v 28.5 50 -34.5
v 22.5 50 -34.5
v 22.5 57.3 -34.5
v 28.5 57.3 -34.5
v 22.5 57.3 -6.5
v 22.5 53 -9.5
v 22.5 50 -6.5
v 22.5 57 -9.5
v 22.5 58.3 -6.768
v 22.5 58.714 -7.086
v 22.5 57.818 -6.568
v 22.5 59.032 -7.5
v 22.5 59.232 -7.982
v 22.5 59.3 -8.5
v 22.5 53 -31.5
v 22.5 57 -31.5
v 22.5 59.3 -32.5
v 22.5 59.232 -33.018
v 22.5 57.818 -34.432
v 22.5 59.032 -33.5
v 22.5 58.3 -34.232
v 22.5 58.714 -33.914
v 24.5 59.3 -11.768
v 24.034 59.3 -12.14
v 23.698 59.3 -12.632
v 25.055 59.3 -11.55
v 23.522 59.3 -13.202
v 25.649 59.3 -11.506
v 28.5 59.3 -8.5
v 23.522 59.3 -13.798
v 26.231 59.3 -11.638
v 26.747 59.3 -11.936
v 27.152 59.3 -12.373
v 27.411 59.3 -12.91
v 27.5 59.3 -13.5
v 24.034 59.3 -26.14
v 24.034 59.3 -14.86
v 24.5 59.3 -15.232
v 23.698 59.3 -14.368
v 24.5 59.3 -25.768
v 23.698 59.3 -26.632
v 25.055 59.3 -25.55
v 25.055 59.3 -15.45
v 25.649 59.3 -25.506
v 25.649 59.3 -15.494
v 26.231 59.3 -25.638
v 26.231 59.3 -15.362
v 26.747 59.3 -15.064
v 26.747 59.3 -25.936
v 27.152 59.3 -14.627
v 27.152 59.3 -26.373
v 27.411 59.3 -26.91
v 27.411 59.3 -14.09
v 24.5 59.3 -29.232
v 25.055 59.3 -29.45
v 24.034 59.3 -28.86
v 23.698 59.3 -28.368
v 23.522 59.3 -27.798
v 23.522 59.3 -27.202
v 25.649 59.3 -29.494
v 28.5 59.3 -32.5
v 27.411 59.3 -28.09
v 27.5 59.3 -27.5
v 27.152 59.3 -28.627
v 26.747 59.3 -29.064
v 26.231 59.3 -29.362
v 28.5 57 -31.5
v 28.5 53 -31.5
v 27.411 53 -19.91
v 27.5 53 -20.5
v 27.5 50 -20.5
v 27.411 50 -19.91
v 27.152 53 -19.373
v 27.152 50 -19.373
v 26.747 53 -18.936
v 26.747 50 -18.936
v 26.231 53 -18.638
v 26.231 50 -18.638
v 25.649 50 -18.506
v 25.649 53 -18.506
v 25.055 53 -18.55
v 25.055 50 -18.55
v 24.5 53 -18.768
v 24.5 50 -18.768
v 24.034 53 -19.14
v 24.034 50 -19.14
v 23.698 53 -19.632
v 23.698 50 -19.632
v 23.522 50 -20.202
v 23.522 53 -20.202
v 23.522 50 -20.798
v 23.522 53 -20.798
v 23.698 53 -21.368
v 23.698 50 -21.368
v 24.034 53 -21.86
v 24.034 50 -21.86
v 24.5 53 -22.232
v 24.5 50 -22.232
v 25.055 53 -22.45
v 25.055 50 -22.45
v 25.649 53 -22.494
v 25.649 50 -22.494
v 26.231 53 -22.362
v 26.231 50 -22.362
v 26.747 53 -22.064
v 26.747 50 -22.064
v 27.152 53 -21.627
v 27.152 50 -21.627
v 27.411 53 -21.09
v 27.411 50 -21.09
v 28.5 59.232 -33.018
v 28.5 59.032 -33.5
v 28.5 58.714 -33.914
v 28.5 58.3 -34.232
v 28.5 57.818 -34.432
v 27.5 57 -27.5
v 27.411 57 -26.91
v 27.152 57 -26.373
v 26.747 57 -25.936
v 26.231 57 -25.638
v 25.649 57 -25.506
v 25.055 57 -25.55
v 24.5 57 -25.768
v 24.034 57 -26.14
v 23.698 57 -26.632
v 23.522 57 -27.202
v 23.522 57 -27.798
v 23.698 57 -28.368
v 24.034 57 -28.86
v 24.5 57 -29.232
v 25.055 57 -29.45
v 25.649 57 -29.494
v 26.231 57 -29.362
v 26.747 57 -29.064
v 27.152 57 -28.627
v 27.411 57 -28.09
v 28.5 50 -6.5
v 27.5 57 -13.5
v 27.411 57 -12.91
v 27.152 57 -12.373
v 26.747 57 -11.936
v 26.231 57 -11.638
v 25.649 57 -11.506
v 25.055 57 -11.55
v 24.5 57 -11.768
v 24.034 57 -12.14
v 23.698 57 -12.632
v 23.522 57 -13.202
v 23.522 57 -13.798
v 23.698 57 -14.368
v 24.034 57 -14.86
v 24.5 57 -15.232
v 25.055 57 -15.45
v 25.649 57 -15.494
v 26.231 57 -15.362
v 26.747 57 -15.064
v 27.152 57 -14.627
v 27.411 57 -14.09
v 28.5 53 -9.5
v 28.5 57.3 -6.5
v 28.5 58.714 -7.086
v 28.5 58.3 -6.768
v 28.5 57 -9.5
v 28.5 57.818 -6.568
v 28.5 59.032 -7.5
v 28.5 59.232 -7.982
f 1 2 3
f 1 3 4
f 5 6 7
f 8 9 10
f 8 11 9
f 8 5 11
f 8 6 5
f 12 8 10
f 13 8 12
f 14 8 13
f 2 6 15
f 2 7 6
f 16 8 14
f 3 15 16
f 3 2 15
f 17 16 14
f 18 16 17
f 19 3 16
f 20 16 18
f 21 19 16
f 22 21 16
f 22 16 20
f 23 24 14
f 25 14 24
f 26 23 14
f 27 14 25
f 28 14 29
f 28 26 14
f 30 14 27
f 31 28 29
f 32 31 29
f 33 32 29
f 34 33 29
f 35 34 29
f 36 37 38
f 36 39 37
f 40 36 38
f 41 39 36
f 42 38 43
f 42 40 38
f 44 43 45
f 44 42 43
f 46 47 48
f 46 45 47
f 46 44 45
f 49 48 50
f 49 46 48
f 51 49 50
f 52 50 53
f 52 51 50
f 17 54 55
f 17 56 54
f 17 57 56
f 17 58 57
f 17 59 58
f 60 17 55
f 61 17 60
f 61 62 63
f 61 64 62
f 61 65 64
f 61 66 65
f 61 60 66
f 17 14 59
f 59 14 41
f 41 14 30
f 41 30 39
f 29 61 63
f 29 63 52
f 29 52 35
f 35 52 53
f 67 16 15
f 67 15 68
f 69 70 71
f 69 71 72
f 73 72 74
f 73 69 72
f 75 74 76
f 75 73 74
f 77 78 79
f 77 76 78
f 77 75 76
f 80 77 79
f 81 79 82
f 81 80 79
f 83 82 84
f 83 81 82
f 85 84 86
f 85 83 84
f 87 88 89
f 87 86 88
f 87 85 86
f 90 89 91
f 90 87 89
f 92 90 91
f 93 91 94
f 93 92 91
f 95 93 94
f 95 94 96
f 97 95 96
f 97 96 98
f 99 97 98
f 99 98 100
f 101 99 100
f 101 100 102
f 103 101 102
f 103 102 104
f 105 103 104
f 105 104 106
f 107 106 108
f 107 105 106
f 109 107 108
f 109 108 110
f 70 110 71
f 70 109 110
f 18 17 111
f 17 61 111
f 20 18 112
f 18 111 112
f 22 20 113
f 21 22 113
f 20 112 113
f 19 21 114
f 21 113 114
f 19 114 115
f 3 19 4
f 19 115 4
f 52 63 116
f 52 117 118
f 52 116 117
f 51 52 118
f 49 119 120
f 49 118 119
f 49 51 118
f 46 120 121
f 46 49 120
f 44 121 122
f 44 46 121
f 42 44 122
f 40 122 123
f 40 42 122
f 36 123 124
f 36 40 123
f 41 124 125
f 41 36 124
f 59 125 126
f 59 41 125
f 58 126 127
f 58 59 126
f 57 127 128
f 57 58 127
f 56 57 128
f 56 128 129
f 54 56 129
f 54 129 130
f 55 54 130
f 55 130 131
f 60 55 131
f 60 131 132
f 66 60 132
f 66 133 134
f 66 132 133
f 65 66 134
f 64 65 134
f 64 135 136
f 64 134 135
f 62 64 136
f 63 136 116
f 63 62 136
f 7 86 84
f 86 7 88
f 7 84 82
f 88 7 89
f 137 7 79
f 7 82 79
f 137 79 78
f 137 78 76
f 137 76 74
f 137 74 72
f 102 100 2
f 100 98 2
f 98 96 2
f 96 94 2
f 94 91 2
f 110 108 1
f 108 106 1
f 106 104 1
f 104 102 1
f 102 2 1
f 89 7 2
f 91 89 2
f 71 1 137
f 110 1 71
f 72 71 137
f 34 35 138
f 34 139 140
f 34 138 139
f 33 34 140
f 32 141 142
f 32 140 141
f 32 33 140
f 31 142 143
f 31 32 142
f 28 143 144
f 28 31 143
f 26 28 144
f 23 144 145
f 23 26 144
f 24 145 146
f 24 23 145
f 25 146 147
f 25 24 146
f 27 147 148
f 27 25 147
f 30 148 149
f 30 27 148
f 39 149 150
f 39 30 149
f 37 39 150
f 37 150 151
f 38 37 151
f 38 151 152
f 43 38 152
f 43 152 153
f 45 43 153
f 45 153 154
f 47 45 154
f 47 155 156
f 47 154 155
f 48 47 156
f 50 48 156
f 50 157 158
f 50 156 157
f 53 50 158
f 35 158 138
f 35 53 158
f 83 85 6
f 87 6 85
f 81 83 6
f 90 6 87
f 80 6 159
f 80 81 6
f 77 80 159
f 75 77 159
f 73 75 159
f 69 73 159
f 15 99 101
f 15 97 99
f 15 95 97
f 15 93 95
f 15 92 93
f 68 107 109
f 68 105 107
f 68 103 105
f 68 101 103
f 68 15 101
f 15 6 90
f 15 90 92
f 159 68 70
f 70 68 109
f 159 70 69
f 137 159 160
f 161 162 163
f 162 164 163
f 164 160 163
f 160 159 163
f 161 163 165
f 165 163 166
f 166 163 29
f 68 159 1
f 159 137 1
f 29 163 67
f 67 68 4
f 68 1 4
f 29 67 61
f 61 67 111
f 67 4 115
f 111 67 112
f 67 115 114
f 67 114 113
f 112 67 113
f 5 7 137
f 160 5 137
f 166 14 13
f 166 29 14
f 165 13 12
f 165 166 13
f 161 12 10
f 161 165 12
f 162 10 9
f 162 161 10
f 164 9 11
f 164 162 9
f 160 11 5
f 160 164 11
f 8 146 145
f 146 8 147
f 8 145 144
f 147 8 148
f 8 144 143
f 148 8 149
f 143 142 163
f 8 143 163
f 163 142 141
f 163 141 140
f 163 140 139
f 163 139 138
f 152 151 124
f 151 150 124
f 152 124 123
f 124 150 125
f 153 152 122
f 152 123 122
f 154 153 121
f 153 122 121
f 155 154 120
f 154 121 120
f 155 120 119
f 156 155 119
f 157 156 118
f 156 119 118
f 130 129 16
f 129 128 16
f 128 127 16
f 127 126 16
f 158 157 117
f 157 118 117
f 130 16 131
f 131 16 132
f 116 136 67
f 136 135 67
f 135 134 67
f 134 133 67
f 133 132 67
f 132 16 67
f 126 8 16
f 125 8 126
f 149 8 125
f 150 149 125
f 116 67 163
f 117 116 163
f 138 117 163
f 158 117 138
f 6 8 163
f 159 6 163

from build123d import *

# Parameters (mm, degrees)
BOX226_W          = 6
BOX226_H          = 4
BOX226_DEPTH      = 3
CYLINDER090_R     = 2
CYLINDER090_DEPTH = 5
CYLINDER089_R     = 2
CYLINDER089_DEPTH = 5
BOX223_W          = 6
BOX223_H          = 2.3
BOX223_DEPTH      = 28
FILLET056_R       = 2
BOX225_W          = 6
BOX225_H          = 4
BOX225_DEPTH      = 3
CYLINDER091_R     = 2
CYLINDER091_DEPTH = 5
BOX224_W          = 6
BOX224_H          = 3
BOX224_DEPTH      = 28


with BuildPart() as cube214:
    # Box226 → Box226 (new body)
    with BuildSketch(Plane(origin=(22.5, 53, -9.5), x_dir=(1, 0, 0), z_dir=(0, 0, 1))):
        with Locations((3, 2)):
            Rectangle(BOX226_W, BOX226_H)
    extrude(amount=BOX226_DEPTH)


with BuildPart() as cylinder171:
    # Cylinder090 → Cylinder090 (new body)
    with BuildSketch(Plane(origin=(25.5, 60, -27.5), x_dir=(1, 0, 0), z_dir=(0, -1, 0))):
        Circle(CYLINDER090_R)
    extrude(amount=CYLINDER090_DEPTH)


with BuildPart() as cylinder170:
    # Cylinder089 → Cylinder089 (new body)
    with BuildSketch(Plane(origin=(25.5, 60, -13.5), x_dir=(1, 0, 0), z_dir=(0, -1, 0))):
        Circle(CYLINDER089_R)
    extrude(amount=CYLINDER089_DEPTH)


with BuildPart() as fillet056:
    # Box223 → Box223 (new body)
    with BuildSketch(Plane(origin=(22.5, 57, -34.5), x_dir=(1, 0, 0), z_dir=(0, 0, 1))):
        with Locations((3, 1.15)):
            Rectangle(BOX223_W, BOX223_H)
    extrude(amount=BOX223_DEPTH)

    # Cut113: cut Cylinder170
    add(cylinder170.part, mode=Mode.SUBTRACT)

    # Cut114: cut Cylinder171
    add(cylinder171.part, mode=Mode.SUBTRACT)

    # Fillet056
    fillet056_edges = [fillet056.edges().sort_by_distance(p)[0] for p in [
        (25.5, 59.3, -6.5),
        (25.5, 59.3, -34.5),
    ]]
    fillet(fillet056_edges, radius=FILLET056_R)


with BuildPart() as cube213:
    # Box225 → Box225 (new body)
    with BuildSketch(Plane(origin=(22.5, 53, -34.5), x_dir=(1, 0, 0), z_dir=(0, 0, 1))):
        with Locations((3, 2)):
            Rectangle(BOX225_W, BOX225_H)
    extrude(amount=BOX225_DEPTH)


with BuildPart() as cylinder172:
    # Cylinder091 → Cylinder091 (new body)
    with BuildSketch(Plane(origin=(25.5, 54, -20.5), x_dir=(1, 0, 0), z_dir=(0, -1, 0))):
        Circle(CYLINDER091_R)
    extrude(amount=CYLINDER091_DEPTH)


with BuildPart() as fusion071:
    # Box224 → Box224 (new body)
    with BuildSketch(Plane(origin=(22.5, 50, -34.5), x_dir=(1, 0, 0), z_dir=(0, 0, 1))):
        with Locations((3, 1.5)):
            Rectangle(BOX224_W, BOX224_H)
    extrude(amount=BOX224_DEPTH)

    # Cut115: cut Cylinder172
    add(cylinder172.part, mode=Mode.SUBTRACT)

    # Fusion071: union Cube214, Fillet056, Cube213
    add(cube214.part)
    add(fillet056.part)
    add(cube213.part)


solid = fusion071.part
